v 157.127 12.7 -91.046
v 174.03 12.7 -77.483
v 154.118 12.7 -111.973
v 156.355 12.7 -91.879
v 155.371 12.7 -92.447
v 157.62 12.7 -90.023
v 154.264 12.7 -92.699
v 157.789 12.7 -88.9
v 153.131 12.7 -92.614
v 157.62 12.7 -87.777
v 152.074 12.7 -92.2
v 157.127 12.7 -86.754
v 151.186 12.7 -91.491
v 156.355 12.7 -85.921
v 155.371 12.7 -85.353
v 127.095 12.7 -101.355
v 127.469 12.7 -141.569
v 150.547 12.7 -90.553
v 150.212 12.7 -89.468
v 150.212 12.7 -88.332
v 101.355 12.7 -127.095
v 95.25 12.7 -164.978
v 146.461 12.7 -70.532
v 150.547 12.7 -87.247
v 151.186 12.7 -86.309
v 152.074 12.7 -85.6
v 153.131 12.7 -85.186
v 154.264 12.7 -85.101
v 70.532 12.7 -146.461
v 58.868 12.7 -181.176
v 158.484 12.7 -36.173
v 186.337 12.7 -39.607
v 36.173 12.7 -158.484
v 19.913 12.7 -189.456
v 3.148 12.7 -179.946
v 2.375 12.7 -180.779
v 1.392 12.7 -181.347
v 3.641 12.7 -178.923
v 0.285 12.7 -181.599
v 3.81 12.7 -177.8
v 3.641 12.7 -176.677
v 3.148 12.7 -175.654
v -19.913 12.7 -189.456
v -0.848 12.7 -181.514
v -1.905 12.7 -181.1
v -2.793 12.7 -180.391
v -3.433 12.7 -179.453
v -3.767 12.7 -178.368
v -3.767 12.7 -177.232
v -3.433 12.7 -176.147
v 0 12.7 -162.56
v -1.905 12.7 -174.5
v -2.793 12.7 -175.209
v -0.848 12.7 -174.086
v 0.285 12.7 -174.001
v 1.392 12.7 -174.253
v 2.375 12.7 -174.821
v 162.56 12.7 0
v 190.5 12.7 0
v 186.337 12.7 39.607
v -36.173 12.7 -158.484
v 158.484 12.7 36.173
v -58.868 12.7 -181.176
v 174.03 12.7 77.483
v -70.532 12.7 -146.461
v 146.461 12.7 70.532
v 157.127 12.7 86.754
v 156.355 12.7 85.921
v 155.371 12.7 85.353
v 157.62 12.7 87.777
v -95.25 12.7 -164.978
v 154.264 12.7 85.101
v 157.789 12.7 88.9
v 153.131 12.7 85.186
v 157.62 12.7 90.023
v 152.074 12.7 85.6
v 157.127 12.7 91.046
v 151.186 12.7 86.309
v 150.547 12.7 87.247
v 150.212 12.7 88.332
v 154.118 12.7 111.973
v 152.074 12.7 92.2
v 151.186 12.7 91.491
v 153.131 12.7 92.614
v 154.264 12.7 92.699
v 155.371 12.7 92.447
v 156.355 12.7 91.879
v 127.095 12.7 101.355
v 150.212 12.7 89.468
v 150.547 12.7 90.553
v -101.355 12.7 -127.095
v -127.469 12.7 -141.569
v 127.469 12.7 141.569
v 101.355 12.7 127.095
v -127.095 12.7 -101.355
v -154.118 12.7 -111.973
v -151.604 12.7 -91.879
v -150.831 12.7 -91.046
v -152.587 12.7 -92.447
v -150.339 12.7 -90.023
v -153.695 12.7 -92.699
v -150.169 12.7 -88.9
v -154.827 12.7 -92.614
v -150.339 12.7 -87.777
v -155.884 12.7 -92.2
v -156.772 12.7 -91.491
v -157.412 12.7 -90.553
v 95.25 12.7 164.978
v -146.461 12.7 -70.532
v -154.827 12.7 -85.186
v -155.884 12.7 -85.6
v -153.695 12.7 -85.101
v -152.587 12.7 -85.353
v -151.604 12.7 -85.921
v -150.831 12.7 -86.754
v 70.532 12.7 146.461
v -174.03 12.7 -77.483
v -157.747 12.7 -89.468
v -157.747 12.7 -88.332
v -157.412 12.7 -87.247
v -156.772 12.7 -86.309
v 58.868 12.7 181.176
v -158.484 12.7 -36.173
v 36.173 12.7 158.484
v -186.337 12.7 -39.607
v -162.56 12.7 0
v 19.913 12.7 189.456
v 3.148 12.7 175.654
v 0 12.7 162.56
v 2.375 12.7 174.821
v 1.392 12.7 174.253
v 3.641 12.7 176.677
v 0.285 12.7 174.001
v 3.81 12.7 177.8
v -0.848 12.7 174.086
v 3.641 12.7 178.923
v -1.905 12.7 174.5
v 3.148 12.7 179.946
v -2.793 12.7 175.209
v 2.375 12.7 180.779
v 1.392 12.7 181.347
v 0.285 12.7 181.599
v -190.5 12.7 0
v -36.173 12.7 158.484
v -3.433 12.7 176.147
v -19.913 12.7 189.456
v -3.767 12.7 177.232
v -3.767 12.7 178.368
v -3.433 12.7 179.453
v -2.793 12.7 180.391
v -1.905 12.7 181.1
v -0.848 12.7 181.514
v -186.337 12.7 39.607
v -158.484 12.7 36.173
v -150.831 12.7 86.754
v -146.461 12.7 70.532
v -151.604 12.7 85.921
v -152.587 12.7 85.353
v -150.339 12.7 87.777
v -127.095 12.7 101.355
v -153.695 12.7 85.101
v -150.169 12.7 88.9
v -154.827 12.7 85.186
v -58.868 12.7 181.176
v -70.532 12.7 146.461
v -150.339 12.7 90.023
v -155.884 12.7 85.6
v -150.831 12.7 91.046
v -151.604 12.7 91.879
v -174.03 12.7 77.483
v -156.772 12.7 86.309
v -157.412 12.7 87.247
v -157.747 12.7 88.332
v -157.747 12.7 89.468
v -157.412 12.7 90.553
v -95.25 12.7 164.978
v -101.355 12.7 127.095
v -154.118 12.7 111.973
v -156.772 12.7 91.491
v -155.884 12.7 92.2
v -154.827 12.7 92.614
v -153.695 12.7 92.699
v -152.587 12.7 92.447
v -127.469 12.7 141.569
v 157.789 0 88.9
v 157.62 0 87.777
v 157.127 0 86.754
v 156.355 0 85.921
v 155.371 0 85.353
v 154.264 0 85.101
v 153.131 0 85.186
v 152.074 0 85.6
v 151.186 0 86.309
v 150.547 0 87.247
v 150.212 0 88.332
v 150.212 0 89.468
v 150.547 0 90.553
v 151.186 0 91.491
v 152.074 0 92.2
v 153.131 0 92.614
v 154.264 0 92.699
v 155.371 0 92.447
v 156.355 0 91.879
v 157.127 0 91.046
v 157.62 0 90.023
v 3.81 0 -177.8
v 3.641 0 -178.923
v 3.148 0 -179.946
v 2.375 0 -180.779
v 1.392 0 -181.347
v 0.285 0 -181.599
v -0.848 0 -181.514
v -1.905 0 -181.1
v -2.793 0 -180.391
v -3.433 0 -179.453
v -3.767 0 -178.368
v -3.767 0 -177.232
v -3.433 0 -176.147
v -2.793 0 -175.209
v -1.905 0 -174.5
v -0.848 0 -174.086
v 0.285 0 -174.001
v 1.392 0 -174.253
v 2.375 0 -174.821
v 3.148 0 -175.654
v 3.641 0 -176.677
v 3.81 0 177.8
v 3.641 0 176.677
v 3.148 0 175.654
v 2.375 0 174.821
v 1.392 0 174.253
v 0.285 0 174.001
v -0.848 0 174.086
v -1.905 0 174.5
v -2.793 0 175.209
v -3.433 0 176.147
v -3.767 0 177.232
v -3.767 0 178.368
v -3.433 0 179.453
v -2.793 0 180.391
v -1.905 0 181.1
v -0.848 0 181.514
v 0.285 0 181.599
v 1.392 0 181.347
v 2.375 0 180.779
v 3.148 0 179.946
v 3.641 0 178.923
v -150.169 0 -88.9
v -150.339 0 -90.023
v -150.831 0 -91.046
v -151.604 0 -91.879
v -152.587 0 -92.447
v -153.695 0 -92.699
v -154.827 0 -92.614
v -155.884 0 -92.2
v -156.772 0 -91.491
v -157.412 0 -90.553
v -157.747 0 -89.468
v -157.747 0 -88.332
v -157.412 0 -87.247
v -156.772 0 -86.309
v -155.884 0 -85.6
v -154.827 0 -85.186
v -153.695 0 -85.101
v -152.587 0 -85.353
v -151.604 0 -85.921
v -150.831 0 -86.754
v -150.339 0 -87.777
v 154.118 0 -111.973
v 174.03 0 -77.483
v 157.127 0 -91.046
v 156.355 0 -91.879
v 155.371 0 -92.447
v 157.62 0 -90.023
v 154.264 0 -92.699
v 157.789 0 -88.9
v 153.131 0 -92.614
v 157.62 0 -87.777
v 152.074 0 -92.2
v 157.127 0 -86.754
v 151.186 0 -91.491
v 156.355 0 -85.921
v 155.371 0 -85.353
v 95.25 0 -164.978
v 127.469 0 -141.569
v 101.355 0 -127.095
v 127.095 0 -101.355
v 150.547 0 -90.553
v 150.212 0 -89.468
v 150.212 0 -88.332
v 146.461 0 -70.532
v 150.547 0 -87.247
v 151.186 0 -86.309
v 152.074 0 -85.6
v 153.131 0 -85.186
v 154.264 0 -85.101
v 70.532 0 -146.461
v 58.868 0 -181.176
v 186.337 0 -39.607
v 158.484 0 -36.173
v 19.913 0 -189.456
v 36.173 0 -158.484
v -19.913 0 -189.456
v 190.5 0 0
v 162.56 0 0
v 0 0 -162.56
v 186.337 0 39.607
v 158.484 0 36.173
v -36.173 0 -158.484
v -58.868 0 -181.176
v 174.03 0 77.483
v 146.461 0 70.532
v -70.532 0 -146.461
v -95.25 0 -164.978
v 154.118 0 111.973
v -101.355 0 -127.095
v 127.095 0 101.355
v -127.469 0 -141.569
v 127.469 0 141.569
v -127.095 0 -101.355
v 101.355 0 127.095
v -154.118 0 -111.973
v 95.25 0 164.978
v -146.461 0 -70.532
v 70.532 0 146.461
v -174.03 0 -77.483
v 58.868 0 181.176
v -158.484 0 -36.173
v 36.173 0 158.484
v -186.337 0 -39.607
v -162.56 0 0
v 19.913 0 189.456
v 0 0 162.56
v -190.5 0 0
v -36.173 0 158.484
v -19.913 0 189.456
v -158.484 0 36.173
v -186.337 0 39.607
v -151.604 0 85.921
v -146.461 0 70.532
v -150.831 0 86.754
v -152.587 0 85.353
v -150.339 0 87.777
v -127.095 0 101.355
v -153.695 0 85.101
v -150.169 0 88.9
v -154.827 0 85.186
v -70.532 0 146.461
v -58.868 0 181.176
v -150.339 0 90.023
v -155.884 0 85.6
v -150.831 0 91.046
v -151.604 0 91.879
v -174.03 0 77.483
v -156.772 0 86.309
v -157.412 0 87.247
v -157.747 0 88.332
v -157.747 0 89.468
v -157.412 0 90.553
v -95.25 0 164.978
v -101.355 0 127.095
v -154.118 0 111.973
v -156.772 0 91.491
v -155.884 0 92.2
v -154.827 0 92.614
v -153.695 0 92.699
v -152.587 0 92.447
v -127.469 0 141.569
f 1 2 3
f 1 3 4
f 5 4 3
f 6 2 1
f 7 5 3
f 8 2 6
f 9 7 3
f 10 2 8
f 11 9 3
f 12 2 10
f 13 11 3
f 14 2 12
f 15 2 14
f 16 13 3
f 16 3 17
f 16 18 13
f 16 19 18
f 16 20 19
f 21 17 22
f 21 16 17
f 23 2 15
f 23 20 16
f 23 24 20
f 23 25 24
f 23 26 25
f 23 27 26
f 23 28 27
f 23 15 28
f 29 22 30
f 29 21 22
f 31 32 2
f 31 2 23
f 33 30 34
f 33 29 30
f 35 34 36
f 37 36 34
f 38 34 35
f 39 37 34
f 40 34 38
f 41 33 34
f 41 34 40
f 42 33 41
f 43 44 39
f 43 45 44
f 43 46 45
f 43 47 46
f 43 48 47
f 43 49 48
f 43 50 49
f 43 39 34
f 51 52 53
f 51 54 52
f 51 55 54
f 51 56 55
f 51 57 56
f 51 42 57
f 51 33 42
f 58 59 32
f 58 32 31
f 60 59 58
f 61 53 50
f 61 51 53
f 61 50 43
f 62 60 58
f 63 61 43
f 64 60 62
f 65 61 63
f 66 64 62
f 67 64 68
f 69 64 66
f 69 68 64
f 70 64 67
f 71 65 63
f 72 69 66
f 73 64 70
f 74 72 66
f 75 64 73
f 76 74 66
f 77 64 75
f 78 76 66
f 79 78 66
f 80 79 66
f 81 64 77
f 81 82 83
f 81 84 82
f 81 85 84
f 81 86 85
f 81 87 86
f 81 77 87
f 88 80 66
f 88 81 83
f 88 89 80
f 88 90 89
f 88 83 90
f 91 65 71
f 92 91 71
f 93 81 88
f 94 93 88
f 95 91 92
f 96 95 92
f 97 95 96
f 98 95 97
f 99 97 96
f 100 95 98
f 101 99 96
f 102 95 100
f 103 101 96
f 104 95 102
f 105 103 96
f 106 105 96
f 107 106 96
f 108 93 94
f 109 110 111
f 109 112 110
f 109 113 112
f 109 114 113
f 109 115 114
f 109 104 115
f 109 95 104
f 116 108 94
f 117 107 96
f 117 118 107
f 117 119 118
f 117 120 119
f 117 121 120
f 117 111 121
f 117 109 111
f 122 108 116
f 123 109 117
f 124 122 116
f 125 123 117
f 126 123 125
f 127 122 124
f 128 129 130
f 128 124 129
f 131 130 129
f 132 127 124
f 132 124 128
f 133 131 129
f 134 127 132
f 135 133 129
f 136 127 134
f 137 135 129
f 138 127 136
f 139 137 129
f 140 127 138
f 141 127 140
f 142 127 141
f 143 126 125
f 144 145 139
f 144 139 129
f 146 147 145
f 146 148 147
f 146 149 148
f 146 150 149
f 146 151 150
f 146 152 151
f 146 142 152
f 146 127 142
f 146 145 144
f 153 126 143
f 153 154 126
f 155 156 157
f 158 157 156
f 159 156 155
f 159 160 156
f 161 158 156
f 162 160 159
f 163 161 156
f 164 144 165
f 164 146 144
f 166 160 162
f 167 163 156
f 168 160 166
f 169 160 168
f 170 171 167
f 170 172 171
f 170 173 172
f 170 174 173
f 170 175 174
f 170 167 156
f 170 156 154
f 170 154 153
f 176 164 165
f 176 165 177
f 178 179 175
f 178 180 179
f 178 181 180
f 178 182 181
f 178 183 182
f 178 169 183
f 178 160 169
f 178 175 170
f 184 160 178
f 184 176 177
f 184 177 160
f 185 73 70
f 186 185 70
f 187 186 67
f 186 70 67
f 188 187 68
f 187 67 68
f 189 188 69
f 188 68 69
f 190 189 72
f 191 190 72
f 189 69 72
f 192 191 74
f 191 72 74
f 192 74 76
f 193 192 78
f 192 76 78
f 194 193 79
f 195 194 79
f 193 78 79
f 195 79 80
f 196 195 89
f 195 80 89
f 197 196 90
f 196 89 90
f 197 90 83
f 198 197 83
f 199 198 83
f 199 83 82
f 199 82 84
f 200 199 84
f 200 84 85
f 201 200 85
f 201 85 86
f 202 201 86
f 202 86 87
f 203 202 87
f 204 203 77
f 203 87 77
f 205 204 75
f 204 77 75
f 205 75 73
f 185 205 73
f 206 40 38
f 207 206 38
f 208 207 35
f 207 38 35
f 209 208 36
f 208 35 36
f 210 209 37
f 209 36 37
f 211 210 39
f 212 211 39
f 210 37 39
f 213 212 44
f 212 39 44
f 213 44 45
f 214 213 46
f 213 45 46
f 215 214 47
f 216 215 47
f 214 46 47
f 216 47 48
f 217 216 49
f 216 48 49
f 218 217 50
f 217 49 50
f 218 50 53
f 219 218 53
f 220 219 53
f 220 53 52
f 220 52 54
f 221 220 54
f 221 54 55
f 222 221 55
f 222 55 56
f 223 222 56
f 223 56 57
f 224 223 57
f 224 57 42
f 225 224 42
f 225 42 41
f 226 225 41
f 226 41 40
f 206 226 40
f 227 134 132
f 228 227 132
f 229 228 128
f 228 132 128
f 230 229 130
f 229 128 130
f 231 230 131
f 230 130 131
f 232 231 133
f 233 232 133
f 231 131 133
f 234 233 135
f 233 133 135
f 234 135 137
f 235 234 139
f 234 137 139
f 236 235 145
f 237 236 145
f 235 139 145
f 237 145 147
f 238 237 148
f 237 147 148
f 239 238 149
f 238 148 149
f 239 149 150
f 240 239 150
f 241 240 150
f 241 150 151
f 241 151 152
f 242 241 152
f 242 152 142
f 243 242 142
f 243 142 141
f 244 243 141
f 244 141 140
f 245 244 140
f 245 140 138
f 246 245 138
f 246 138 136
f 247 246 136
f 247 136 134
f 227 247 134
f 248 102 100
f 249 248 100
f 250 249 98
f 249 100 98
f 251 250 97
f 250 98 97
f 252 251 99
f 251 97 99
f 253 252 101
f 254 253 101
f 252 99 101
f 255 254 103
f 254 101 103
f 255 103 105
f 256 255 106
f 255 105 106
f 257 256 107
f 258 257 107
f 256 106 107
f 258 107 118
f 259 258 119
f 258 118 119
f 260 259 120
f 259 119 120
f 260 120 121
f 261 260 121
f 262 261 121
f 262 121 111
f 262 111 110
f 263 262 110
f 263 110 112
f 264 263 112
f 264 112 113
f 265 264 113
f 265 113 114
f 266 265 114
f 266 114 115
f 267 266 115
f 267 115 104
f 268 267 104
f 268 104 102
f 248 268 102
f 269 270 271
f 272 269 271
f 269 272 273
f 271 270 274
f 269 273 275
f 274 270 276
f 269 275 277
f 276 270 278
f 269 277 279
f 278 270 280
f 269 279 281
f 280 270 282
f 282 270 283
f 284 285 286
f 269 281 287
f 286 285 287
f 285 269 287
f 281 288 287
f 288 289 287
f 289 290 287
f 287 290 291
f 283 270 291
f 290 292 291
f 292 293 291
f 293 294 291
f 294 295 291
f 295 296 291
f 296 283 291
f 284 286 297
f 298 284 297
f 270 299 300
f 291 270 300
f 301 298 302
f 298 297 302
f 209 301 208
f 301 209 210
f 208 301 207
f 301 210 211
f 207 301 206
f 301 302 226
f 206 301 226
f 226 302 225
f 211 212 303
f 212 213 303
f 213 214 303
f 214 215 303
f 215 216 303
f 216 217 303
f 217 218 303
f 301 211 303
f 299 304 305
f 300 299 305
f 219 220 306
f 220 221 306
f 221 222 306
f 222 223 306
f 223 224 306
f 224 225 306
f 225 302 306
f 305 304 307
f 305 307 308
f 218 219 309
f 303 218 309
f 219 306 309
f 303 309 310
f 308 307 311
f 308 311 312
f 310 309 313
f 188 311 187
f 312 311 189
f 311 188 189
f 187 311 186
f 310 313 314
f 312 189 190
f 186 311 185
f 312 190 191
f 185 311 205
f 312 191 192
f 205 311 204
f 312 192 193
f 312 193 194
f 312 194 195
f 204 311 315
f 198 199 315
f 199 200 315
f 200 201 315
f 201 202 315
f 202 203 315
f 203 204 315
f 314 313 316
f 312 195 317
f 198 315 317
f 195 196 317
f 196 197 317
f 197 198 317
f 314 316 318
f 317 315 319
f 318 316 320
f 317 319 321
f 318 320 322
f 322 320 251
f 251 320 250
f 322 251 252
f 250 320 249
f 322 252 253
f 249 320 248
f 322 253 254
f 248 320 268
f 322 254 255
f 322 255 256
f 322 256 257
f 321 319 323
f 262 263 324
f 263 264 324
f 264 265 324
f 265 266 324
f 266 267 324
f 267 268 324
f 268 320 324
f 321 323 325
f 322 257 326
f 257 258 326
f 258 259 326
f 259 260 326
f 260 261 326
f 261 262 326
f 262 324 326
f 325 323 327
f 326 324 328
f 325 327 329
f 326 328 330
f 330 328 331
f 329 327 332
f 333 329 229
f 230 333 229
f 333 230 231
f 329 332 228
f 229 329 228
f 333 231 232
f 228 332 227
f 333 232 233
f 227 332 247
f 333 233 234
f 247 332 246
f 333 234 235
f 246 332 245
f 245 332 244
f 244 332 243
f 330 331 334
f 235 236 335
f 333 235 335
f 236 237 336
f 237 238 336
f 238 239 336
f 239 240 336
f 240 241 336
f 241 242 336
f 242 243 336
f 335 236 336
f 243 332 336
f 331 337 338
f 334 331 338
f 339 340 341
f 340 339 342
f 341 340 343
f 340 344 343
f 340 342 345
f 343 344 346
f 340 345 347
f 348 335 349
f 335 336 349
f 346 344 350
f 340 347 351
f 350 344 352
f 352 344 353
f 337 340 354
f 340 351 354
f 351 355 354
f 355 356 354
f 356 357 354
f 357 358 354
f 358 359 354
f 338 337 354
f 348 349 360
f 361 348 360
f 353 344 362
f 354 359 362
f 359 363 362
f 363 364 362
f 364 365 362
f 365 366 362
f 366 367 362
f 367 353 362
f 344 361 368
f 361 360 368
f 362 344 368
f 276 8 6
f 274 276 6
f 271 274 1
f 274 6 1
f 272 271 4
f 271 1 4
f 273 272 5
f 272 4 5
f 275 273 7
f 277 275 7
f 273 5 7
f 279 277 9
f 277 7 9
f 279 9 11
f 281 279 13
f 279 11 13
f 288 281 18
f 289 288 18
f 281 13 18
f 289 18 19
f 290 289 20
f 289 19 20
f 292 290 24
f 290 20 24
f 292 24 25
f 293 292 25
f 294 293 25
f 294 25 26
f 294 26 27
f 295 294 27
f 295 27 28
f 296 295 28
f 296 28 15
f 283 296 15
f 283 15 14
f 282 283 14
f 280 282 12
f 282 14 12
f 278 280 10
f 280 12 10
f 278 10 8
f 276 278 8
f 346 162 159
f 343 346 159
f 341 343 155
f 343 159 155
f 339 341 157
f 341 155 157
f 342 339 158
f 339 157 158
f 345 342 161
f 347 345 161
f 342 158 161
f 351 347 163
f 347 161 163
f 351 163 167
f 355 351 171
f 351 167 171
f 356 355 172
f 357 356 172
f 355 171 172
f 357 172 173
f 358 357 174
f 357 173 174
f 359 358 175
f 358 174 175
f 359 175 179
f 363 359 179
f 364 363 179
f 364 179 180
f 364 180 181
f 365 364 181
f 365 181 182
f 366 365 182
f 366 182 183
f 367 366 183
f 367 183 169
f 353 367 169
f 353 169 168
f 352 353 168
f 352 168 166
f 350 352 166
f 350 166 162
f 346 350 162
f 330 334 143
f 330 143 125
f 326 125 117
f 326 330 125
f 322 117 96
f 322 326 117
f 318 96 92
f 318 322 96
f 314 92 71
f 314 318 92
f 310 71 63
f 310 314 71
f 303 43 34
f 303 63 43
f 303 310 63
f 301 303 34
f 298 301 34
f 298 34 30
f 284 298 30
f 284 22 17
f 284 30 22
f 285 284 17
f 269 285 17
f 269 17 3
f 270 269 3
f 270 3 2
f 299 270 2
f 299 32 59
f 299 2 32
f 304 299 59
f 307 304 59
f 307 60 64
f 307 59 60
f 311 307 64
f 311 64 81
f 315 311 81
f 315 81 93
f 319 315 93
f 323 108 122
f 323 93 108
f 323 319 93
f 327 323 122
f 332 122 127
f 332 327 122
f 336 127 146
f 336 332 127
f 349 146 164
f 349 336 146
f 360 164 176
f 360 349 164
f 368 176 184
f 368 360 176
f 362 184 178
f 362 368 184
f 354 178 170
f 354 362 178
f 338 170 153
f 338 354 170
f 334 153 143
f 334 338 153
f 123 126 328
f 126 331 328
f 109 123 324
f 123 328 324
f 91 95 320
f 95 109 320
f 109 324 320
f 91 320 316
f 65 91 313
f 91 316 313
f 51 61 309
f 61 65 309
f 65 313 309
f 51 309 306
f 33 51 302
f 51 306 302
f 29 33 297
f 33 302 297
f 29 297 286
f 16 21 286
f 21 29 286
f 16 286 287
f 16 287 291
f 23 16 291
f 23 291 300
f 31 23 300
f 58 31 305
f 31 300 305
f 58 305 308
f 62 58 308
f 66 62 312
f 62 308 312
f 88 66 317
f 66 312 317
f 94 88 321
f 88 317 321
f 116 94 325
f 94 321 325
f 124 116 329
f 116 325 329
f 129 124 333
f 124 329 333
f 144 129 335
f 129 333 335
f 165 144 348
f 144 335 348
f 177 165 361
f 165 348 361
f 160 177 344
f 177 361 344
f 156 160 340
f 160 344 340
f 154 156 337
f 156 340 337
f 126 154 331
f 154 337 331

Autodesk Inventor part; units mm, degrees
ref_plane "YZ Plane" through (0, 0, 0) normal (1, 0, 0) x (0, 1, 0)
ref_plane "XZ Plane" through (0, 0, 0) normal (0, 1, 0) x (-1, 0, 0)
ref_plane "XY Plane" through (0, 0, 0) normal (0, 0, 1) x (1, 0, 0)
sketch "Sketch1" plane through (0, 0, 0) normal (0, 1, 0) x (-1, 0, 0)
  circle A0 centre (0, 0) radius 162.56
  circle A1 centre (0, 0) radius 190.5
  dimension "d0" = 325.12
  dimension "d1" = 381
extrude "Extrusion1" add sketch "Sketch1" along normal blind 12.7
sketch "Sketch2" plane through (0, 12.7, 0) normal (0, 1, 0) x (1, 0, 0)
  line L0 (0, 0) -> (0, -177.8) construction
  line L1 (0, 0) -> (177.8, 0) construction
  circle A0 centre (0, -177.8) radius 3.81
  circle A1 centre (153.9793, -88.9) radius 3.81
  circle A2 centre (153.9793, 88.9) radius 3.81
  circle A3 centre (0, 177.8) radius 3.81
  circle A4 centre (-153.9793, 88.9) radius 3.81
  circle A5 centre (-153.9793, -88.9) radius 3.81
  dimension "d6" = 177.8
  dimension "d7" = 90
  dimension "d8" = 7.62
  dimension "d9" = 360
extrude "Extrusion2" cut sketch "Sketch2" against normal through all
properties part number "Turntable Sheath" material "PVC-Piping"
